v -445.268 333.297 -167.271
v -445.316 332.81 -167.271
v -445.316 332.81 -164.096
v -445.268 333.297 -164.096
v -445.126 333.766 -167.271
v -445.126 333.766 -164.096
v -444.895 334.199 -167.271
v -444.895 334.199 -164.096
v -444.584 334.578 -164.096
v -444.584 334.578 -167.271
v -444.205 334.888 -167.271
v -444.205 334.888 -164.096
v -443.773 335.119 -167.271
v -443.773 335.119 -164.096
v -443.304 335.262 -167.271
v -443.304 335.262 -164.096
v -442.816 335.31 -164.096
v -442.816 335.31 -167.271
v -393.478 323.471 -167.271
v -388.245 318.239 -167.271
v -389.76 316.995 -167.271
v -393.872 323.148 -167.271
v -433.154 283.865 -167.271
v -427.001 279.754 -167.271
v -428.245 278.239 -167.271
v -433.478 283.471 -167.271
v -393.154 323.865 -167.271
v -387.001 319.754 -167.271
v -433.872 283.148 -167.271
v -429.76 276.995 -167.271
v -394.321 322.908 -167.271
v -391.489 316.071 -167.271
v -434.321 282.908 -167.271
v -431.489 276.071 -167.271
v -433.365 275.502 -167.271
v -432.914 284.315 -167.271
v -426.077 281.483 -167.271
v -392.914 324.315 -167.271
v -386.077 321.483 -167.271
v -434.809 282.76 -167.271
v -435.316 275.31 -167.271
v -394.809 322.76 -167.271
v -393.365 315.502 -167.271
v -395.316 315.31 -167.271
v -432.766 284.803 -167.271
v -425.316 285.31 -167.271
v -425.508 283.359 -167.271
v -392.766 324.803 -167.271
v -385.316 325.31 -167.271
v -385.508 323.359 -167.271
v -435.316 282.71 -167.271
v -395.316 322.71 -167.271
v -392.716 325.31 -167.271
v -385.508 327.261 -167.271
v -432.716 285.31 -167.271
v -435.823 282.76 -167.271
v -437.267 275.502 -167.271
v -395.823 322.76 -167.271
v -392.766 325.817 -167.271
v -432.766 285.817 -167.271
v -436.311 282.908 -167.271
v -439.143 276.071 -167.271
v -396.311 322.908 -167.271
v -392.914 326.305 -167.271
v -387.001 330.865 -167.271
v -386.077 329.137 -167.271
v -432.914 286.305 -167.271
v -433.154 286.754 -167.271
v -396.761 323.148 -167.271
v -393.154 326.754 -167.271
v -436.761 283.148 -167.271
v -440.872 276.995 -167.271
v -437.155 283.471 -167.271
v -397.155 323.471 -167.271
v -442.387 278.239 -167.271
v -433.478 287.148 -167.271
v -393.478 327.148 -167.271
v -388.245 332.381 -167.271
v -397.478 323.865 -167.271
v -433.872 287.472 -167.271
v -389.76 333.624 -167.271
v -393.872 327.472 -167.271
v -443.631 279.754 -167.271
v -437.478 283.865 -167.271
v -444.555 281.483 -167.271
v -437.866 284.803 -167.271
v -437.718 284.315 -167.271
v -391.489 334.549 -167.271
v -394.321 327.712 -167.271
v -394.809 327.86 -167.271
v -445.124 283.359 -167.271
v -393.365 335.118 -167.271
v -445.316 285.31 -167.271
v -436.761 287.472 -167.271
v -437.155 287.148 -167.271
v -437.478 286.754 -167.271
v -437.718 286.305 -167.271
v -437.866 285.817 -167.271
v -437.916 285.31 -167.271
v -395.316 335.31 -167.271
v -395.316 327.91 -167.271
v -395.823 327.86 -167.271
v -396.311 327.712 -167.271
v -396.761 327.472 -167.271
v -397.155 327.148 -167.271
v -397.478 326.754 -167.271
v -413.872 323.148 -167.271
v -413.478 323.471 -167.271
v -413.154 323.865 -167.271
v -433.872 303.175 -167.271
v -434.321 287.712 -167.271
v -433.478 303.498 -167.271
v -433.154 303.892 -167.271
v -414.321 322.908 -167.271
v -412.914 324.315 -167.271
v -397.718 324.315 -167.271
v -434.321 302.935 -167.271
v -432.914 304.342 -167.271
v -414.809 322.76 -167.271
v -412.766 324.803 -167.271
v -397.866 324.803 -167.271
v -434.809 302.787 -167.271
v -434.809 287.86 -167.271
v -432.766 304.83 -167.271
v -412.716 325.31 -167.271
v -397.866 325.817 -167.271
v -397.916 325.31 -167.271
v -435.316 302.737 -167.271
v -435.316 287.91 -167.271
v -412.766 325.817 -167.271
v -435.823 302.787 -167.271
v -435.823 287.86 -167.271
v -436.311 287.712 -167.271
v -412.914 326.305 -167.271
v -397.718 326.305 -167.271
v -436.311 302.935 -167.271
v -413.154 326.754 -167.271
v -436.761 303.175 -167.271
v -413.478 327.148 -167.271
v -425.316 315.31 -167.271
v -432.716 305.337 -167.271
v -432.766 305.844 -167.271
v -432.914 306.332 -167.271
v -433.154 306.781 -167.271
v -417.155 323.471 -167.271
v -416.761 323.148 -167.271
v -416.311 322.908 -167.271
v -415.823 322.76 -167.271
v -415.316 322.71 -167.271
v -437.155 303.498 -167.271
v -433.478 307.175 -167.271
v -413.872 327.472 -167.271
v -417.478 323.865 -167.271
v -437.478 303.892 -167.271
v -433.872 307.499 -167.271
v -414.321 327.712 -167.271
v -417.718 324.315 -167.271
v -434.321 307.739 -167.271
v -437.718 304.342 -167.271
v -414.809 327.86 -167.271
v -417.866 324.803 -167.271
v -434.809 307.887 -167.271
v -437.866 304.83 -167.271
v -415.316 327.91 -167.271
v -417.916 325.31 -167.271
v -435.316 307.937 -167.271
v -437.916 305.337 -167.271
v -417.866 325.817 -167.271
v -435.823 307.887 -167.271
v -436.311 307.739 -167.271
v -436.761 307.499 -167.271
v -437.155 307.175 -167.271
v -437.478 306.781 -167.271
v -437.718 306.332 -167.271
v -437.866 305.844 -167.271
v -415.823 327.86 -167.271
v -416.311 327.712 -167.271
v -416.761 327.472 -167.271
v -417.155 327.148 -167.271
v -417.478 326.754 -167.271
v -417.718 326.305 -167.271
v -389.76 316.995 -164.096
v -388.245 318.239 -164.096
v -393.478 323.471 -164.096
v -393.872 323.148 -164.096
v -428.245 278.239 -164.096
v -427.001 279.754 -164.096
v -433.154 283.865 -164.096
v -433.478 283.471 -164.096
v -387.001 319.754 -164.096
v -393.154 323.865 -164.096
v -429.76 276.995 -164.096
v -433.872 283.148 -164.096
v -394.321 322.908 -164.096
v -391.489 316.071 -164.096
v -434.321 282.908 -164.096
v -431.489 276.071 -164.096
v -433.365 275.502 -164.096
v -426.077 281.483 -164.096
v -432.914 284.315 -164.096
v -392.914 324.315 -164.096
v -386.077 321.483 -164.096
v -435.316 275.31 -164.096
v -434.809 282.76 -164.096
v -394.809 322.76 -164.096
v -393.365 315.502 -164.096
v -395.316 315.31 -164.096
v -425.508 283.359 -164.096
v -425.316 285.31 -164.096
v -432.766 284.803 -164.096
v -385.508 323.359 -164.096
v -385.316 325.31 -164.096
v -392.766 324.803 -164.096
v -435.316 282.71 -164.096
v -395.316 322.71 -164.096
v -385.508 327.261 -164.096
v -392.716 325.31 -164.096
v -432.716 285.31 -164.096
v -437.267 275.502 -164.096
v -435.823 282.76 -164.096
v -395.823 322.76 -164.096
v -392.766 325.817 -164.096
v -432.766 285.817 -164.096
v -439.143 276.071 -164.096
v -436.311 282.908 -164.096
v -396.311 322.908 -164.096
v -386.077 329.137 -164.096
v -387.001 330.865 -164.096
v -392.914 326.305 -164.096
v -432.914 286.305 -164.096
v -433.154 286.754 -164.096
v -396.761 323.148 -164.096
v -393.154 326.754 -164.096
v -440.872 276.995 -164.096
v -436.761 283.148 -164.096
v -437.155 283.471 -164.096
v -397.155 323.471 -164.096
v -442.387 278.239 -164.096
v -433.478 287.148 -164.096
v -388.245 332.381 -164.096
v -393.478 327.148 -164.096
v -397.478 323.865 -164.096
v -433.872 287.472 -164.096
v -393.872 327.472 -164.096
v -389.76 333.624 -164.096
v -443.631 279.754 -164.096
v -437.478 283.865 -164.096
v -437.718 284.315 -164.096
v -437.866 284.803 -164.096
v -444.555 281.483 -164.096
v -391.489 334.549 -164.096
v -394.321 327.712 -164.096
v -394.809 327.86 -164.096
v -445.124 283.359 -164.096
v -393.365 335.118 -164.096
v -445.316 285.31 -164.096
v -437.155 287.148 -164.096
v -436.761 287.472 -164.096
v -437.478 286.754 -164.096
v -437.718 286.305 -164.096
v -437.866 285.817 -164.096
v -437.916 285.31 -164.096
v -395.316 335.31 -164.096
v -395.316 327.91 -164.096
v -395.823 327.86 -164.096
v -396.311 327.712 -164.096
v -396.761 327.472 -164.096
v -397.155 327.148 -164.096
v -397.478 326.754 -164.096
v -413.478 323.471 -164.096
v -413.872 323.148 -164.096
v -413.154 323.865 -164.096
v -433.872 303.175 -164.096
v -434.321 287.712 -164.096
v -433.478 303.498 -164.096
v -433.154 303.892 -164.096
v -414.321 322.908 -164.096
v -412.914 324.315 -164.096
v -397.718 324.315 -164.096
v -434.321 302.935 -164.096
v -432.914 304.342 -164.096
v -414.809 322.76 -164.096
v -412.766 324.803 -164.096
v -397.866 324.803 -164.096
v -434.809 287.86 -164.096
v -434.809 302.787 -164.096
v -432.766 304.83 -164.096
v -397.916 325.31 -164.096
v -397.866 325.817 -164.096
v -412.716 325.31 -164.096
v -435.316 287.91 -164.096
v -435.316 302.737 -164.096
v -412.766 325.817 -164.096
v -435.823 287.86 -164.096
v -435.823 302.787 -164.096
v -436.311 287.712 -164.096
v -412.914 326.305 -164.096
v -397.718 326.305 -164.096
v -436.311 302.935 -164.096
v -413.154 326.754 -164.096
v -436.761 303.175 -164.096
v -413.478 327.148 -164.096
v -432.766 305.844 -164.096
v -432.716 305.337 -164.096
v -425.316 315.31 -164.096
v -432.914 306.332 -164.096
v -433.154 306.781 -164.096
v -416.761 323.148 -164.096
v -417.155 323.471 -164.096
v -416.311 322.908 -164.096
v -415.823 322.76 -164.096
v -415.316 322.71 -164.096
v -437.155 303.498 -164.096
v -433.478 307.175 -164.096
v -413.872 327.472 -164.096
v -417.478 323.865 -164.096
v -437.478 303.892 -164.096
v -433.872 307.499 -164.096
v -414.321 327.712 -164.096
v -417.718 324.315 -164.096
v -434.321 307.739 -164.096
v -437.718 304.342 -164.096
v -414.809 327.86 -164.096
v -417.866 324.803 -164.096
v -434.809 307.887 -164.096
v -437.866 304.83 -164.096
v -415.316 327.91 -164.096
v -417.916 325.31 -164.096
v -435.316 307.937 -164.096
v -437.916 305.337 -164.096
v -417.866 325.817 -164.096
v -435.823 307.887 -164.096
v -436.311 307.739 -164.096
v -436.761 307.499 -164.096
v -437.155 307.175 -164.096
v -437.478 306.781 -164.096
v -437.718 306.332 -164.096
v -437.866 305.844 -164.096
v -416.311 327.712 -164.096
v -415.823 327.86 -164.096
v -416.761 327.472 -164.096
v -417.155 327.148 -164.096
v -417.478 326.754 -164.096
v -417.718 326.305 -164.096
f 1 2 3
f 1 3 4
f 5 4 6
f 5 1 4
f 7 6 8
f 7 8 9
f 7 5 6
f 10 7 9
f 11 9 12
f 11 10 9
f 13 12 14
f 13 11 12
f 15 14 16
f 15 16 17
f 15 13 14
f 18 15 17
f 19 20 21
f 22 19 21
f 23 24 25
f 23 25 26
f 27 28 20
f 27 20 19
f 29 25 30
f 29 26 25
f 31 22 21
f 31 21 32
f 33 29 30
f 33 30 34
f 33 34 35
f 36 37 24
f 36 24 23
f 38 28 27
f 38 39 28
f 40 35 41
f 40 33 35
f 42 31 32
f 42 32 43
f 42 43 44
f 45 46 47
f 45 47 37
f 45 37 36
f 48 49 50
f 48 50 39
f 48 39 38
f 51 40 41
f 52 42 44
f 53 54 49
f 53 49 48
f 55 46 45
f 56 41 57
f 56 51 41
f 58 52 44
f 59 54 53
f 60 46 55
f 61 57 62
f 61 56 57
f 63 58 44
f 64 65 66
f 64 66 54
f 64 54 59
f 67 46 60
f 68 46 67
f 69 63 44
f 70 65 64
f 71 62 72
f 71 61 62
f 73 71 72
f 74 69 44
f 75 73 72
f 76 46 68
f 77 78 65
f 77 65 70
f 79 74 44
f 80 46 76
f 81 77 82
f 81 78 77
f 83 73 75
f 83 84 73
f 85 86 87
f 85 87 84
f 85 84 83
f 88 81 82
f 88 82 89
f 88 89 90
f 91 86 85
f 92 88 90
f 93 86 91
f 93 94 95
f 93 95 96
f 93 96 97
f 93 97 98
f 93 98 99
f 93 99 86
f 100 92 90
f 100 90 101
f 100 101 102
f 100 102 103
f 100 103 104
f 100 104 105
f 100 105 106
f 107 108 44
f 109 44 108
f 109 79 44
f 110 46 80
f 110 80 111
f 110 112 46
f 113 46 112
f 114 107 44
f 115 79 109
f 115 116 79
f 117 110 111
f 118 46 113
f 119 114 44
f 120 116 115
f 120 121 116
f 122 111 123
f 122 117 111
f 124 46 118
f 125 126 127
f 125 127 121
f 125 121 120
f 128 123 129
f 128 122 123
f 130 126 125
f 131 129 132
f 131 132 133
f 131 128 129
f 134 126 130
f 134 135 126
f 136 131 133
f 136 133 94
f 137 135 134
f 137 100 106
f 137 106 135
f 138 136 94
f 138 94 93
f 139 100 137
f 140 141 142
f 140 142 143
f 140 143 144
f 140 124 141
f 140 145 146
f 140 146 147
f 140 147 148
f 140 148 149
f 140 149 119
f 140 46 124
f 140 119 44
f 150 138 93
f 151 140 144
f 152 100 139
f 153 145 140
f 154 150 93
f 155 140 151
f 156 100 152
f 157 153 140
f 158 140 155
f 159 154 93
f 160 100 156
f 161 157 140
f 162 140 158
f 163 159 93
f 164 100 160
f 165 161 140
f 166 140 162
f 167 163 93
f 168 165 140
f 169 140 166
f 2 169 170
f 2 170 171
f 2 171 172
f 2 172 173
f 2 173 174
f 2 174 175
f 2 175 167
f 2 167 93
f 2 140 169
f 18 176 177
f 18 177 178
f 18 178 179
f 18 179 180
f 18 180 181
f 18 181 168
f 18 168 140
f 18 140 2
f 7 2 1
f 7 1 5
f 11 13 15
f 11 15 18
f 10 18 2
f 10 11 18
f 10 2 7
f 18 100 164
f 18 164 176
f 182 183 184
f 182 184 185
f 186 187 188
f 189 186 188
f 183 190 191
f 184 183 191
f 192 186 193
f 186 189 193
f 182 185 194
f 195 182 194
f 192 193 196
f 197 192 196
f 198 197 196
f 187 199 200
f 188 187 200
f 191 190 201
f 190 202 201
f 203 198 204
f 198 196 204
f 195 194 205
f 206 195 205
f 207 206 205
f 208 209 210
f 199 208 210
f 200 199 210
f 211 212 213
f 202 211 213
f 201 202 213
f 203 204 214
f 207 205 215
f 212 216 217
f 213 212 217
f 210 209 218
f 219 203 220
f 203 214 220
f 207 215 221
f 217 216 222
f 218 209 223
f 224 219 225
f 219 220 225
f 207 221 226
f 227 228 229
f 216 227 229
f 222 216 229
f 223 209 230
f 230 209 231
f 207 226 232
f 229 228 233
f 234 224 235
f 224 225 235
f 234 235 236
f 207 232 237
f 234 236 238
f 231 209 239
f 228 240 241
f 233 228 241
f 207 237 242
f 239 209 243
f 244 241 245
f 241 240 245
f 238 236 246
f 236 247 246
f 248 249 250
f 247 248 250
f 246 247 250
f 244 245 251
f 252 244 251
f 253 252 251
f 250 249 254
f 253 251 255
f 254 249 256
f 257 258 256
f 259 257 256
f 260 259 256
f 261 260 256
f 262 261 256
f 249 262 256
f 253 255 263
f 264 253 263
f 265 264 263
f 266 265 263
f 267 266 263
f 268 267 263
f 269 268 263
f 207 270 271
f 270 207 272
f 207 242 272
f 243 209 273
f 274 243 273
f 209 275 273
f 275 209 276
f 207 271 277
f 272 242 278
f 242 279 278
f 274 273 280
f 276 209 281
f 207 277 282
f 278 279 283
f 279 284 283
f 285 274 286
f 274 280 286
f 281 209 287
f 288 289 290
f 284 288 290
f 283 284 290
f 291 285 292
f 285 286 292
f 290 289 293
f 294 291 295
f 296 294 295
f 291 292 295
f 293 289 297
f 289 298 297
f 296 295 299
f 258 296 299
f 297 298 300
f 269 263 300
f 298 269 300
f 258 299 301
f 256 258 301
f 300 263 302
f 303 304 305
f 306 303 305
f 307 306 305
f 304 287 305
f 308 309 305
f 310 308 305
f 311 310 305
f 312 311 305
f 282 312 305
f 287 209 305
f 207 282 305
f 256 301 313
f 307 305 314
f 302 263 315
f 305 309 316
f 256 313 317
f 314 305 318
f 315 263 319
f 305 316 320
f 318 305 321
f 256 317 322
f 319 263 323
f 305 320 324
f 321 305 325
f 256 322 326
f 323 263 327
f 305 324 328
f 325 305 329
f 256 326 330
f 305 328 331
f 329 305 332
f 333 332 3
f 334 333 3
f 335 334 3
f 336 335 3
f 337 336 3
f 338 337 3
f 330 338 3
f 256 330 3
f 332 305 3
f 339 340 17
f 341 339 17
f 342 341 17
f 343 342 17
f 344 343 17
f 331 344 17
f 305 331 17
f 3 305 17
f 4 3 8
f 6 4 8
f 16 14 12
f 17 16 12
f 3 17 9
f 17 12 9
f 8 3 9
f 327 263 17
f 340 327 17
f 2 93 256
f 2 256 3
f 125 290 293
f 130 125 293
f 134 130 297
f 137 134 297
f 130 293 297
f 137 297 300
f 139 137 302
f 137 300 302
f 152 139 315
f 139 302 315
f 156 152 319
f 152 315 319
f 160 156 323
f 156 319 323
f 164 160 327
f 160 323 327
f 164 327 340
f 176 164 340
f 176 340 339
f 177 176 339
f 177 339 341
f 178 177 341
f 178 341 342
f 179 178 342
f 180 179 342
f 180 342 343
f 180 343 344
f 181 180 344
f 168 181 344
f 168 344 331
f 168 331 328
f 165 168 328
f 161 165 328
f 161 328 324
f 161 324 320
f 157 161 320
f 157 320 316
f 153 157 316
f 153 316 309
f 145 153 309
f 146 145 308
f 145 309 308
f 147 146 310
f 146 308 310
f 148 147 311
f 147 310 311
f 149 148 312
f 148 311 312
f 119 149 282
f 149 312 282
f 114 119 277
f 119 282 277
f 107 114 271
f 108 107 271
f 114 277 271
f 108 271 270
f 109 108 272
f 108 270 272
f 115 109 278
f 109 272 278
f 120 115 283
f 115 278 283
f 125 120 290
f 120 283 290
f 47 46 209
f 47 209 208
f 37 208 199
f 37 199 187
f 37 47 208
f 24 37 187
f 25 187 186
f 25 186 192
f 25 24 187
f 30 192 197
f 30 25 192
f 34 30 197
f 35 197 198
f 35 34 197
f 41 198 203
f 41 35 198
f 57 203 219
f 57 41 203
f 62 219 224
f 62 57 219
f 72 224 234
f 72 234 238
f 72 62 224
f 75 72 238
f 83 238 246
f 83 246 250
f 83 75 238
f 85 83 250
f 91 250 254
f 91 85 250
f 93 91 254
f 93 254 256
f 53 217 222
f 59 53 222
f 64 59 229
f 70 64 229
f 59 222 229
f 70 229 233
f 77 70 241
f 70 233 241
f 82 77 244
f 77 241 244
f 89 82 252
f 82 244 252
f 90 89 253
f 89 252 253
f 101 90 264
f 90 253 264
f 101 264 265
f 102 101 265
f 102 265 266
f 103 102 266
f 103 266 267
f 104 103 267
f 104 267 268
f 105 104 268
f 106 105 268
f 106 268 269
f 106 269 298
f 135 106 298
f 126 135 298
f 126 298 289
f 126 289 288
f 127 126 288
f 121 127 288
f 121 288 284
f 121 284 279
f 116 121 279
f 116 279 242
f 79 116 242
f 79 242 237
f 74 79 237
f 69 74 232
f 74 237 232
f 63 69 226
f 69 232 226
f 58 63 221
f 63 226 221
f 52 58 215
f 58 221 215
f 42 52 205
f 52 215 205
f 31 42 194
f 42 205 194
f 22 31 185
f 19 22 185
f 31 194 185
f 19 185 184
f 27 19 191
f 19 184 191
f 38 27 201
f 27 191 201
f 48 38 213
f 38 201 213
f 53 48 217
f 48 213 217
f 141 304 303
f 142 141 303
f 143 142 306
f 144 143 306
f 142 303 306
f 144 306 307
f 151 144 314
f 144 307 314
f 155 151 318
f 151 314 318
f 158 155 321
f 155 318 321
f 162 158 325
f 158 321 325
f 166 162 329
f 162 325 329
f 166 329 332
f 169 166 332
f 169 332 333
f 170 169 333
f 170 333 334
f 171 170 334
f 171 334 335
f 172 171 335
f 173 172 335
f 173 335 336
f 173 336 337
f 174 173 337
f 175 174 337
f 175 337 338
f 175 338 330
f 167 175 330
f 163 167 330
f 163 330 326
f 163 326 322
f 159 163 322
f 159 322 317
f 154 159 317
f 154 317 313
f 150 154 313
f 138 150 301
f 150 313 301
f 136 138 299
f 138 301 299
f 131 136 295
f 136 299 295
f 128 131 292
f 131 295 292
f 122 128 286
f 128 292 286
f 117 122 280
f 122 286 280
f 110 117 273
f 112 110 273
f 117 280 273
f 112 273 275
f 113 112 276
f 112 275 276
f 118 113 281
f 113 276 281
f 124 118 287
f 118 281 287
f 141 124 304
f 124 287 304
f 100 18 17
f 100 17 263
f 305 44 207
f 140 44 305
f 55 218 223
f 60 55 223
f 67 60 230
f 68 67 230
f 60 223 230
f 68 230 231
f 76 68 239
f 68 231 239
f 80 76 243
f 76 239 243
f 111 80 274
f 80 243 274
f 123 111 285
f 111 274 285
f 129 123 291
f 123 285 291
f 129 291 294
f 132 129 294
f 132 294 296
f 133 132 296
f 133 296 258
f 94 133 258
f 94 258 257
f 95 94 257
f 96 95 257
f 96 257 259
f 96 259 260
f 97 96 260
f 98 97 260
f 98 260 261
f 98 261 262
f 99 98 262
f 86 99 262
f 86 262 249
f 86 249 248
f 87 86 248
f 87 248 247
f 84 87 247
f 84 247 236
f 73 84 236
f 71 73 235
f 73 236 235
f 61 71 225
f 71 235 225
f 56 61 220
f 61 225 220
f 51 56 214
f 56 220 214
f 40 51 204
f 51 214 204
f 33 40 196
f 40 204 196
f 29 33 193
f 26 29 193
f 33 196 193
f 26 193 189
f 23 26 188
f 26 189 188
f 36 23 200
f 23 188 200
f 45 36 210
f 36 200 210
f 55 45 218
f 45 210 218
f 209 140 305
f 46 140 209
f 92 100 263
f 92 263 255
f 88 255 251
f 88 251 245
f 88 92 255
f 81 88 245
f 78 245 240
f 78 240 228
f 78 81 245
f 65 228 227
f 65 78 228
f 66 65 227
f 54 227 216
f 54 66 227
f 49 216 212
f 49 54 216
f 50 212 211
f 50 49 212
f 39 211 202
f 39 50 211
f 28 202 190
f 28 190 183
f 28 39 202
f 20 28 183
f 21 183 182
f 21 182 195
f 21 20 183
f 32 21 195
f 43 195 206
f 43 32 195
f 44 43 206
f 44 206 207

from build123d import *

# Parameters (mm, degrees)
BASE_FLANGE1_DEPTH         = 3.175
F_5_2_5_2_DIAMETER_HOLE1_D = 5.2


# Sheet-metal steps are written as plain solids
with BuildPart() as part:
    # Sketch11 → Base-Flange1 (new body)
    with BuildSketch(Plane(origin=(0, 0, -167.271453779), x_dir=(-1, 0, 0), z_dir=(0, 0, -1))):
        with BuildLine():
            Line((395.316058397, 315.309736729), (425.316058397, 315.309736729))
            Line((425.316058397, 315.309736729), (425.316058397, 285.309736729))
            ThreePointArc((425.316058397, 285.309736729), (435.316058397, 275.309736729), (445.316058397, 285.309736729))
            Line((445.316058397, 285.309736729), (445.316058397, 332.809736729))
            ThreePointArc((445.316058397, 332.809736729), (444.58382535, 334.577503682), (442.816058397, 335.309736729))
            Line((442.816058397, 335.309736729), (395.316058397, 335.309736729))
            ThreePointArc((395.316058397, 335.309736729), (385.316058397, 325.309736729), (395.316058397, 315.309736729))
        make_face()
    extrude(amount=-BASE_FLANGE1_DEPTH)

    # Ø5.2 (5.2) Diameter Hole1 (through all)
    with Locations(Plane(origin=(0, 0, -167.271453779), x_dir=(-1, 0, 0), z_dir=(0, 0, -1))):
        with Locations((435.316058397, 285.309736729), (395.316058397, 325.309736729), (415.316058397, 325.309736729), (435.316058397, 305.336856842)):
            Hole(F_5_2_5_2_DIAMETER_HOLE1_D / 2)


solid = part.part
